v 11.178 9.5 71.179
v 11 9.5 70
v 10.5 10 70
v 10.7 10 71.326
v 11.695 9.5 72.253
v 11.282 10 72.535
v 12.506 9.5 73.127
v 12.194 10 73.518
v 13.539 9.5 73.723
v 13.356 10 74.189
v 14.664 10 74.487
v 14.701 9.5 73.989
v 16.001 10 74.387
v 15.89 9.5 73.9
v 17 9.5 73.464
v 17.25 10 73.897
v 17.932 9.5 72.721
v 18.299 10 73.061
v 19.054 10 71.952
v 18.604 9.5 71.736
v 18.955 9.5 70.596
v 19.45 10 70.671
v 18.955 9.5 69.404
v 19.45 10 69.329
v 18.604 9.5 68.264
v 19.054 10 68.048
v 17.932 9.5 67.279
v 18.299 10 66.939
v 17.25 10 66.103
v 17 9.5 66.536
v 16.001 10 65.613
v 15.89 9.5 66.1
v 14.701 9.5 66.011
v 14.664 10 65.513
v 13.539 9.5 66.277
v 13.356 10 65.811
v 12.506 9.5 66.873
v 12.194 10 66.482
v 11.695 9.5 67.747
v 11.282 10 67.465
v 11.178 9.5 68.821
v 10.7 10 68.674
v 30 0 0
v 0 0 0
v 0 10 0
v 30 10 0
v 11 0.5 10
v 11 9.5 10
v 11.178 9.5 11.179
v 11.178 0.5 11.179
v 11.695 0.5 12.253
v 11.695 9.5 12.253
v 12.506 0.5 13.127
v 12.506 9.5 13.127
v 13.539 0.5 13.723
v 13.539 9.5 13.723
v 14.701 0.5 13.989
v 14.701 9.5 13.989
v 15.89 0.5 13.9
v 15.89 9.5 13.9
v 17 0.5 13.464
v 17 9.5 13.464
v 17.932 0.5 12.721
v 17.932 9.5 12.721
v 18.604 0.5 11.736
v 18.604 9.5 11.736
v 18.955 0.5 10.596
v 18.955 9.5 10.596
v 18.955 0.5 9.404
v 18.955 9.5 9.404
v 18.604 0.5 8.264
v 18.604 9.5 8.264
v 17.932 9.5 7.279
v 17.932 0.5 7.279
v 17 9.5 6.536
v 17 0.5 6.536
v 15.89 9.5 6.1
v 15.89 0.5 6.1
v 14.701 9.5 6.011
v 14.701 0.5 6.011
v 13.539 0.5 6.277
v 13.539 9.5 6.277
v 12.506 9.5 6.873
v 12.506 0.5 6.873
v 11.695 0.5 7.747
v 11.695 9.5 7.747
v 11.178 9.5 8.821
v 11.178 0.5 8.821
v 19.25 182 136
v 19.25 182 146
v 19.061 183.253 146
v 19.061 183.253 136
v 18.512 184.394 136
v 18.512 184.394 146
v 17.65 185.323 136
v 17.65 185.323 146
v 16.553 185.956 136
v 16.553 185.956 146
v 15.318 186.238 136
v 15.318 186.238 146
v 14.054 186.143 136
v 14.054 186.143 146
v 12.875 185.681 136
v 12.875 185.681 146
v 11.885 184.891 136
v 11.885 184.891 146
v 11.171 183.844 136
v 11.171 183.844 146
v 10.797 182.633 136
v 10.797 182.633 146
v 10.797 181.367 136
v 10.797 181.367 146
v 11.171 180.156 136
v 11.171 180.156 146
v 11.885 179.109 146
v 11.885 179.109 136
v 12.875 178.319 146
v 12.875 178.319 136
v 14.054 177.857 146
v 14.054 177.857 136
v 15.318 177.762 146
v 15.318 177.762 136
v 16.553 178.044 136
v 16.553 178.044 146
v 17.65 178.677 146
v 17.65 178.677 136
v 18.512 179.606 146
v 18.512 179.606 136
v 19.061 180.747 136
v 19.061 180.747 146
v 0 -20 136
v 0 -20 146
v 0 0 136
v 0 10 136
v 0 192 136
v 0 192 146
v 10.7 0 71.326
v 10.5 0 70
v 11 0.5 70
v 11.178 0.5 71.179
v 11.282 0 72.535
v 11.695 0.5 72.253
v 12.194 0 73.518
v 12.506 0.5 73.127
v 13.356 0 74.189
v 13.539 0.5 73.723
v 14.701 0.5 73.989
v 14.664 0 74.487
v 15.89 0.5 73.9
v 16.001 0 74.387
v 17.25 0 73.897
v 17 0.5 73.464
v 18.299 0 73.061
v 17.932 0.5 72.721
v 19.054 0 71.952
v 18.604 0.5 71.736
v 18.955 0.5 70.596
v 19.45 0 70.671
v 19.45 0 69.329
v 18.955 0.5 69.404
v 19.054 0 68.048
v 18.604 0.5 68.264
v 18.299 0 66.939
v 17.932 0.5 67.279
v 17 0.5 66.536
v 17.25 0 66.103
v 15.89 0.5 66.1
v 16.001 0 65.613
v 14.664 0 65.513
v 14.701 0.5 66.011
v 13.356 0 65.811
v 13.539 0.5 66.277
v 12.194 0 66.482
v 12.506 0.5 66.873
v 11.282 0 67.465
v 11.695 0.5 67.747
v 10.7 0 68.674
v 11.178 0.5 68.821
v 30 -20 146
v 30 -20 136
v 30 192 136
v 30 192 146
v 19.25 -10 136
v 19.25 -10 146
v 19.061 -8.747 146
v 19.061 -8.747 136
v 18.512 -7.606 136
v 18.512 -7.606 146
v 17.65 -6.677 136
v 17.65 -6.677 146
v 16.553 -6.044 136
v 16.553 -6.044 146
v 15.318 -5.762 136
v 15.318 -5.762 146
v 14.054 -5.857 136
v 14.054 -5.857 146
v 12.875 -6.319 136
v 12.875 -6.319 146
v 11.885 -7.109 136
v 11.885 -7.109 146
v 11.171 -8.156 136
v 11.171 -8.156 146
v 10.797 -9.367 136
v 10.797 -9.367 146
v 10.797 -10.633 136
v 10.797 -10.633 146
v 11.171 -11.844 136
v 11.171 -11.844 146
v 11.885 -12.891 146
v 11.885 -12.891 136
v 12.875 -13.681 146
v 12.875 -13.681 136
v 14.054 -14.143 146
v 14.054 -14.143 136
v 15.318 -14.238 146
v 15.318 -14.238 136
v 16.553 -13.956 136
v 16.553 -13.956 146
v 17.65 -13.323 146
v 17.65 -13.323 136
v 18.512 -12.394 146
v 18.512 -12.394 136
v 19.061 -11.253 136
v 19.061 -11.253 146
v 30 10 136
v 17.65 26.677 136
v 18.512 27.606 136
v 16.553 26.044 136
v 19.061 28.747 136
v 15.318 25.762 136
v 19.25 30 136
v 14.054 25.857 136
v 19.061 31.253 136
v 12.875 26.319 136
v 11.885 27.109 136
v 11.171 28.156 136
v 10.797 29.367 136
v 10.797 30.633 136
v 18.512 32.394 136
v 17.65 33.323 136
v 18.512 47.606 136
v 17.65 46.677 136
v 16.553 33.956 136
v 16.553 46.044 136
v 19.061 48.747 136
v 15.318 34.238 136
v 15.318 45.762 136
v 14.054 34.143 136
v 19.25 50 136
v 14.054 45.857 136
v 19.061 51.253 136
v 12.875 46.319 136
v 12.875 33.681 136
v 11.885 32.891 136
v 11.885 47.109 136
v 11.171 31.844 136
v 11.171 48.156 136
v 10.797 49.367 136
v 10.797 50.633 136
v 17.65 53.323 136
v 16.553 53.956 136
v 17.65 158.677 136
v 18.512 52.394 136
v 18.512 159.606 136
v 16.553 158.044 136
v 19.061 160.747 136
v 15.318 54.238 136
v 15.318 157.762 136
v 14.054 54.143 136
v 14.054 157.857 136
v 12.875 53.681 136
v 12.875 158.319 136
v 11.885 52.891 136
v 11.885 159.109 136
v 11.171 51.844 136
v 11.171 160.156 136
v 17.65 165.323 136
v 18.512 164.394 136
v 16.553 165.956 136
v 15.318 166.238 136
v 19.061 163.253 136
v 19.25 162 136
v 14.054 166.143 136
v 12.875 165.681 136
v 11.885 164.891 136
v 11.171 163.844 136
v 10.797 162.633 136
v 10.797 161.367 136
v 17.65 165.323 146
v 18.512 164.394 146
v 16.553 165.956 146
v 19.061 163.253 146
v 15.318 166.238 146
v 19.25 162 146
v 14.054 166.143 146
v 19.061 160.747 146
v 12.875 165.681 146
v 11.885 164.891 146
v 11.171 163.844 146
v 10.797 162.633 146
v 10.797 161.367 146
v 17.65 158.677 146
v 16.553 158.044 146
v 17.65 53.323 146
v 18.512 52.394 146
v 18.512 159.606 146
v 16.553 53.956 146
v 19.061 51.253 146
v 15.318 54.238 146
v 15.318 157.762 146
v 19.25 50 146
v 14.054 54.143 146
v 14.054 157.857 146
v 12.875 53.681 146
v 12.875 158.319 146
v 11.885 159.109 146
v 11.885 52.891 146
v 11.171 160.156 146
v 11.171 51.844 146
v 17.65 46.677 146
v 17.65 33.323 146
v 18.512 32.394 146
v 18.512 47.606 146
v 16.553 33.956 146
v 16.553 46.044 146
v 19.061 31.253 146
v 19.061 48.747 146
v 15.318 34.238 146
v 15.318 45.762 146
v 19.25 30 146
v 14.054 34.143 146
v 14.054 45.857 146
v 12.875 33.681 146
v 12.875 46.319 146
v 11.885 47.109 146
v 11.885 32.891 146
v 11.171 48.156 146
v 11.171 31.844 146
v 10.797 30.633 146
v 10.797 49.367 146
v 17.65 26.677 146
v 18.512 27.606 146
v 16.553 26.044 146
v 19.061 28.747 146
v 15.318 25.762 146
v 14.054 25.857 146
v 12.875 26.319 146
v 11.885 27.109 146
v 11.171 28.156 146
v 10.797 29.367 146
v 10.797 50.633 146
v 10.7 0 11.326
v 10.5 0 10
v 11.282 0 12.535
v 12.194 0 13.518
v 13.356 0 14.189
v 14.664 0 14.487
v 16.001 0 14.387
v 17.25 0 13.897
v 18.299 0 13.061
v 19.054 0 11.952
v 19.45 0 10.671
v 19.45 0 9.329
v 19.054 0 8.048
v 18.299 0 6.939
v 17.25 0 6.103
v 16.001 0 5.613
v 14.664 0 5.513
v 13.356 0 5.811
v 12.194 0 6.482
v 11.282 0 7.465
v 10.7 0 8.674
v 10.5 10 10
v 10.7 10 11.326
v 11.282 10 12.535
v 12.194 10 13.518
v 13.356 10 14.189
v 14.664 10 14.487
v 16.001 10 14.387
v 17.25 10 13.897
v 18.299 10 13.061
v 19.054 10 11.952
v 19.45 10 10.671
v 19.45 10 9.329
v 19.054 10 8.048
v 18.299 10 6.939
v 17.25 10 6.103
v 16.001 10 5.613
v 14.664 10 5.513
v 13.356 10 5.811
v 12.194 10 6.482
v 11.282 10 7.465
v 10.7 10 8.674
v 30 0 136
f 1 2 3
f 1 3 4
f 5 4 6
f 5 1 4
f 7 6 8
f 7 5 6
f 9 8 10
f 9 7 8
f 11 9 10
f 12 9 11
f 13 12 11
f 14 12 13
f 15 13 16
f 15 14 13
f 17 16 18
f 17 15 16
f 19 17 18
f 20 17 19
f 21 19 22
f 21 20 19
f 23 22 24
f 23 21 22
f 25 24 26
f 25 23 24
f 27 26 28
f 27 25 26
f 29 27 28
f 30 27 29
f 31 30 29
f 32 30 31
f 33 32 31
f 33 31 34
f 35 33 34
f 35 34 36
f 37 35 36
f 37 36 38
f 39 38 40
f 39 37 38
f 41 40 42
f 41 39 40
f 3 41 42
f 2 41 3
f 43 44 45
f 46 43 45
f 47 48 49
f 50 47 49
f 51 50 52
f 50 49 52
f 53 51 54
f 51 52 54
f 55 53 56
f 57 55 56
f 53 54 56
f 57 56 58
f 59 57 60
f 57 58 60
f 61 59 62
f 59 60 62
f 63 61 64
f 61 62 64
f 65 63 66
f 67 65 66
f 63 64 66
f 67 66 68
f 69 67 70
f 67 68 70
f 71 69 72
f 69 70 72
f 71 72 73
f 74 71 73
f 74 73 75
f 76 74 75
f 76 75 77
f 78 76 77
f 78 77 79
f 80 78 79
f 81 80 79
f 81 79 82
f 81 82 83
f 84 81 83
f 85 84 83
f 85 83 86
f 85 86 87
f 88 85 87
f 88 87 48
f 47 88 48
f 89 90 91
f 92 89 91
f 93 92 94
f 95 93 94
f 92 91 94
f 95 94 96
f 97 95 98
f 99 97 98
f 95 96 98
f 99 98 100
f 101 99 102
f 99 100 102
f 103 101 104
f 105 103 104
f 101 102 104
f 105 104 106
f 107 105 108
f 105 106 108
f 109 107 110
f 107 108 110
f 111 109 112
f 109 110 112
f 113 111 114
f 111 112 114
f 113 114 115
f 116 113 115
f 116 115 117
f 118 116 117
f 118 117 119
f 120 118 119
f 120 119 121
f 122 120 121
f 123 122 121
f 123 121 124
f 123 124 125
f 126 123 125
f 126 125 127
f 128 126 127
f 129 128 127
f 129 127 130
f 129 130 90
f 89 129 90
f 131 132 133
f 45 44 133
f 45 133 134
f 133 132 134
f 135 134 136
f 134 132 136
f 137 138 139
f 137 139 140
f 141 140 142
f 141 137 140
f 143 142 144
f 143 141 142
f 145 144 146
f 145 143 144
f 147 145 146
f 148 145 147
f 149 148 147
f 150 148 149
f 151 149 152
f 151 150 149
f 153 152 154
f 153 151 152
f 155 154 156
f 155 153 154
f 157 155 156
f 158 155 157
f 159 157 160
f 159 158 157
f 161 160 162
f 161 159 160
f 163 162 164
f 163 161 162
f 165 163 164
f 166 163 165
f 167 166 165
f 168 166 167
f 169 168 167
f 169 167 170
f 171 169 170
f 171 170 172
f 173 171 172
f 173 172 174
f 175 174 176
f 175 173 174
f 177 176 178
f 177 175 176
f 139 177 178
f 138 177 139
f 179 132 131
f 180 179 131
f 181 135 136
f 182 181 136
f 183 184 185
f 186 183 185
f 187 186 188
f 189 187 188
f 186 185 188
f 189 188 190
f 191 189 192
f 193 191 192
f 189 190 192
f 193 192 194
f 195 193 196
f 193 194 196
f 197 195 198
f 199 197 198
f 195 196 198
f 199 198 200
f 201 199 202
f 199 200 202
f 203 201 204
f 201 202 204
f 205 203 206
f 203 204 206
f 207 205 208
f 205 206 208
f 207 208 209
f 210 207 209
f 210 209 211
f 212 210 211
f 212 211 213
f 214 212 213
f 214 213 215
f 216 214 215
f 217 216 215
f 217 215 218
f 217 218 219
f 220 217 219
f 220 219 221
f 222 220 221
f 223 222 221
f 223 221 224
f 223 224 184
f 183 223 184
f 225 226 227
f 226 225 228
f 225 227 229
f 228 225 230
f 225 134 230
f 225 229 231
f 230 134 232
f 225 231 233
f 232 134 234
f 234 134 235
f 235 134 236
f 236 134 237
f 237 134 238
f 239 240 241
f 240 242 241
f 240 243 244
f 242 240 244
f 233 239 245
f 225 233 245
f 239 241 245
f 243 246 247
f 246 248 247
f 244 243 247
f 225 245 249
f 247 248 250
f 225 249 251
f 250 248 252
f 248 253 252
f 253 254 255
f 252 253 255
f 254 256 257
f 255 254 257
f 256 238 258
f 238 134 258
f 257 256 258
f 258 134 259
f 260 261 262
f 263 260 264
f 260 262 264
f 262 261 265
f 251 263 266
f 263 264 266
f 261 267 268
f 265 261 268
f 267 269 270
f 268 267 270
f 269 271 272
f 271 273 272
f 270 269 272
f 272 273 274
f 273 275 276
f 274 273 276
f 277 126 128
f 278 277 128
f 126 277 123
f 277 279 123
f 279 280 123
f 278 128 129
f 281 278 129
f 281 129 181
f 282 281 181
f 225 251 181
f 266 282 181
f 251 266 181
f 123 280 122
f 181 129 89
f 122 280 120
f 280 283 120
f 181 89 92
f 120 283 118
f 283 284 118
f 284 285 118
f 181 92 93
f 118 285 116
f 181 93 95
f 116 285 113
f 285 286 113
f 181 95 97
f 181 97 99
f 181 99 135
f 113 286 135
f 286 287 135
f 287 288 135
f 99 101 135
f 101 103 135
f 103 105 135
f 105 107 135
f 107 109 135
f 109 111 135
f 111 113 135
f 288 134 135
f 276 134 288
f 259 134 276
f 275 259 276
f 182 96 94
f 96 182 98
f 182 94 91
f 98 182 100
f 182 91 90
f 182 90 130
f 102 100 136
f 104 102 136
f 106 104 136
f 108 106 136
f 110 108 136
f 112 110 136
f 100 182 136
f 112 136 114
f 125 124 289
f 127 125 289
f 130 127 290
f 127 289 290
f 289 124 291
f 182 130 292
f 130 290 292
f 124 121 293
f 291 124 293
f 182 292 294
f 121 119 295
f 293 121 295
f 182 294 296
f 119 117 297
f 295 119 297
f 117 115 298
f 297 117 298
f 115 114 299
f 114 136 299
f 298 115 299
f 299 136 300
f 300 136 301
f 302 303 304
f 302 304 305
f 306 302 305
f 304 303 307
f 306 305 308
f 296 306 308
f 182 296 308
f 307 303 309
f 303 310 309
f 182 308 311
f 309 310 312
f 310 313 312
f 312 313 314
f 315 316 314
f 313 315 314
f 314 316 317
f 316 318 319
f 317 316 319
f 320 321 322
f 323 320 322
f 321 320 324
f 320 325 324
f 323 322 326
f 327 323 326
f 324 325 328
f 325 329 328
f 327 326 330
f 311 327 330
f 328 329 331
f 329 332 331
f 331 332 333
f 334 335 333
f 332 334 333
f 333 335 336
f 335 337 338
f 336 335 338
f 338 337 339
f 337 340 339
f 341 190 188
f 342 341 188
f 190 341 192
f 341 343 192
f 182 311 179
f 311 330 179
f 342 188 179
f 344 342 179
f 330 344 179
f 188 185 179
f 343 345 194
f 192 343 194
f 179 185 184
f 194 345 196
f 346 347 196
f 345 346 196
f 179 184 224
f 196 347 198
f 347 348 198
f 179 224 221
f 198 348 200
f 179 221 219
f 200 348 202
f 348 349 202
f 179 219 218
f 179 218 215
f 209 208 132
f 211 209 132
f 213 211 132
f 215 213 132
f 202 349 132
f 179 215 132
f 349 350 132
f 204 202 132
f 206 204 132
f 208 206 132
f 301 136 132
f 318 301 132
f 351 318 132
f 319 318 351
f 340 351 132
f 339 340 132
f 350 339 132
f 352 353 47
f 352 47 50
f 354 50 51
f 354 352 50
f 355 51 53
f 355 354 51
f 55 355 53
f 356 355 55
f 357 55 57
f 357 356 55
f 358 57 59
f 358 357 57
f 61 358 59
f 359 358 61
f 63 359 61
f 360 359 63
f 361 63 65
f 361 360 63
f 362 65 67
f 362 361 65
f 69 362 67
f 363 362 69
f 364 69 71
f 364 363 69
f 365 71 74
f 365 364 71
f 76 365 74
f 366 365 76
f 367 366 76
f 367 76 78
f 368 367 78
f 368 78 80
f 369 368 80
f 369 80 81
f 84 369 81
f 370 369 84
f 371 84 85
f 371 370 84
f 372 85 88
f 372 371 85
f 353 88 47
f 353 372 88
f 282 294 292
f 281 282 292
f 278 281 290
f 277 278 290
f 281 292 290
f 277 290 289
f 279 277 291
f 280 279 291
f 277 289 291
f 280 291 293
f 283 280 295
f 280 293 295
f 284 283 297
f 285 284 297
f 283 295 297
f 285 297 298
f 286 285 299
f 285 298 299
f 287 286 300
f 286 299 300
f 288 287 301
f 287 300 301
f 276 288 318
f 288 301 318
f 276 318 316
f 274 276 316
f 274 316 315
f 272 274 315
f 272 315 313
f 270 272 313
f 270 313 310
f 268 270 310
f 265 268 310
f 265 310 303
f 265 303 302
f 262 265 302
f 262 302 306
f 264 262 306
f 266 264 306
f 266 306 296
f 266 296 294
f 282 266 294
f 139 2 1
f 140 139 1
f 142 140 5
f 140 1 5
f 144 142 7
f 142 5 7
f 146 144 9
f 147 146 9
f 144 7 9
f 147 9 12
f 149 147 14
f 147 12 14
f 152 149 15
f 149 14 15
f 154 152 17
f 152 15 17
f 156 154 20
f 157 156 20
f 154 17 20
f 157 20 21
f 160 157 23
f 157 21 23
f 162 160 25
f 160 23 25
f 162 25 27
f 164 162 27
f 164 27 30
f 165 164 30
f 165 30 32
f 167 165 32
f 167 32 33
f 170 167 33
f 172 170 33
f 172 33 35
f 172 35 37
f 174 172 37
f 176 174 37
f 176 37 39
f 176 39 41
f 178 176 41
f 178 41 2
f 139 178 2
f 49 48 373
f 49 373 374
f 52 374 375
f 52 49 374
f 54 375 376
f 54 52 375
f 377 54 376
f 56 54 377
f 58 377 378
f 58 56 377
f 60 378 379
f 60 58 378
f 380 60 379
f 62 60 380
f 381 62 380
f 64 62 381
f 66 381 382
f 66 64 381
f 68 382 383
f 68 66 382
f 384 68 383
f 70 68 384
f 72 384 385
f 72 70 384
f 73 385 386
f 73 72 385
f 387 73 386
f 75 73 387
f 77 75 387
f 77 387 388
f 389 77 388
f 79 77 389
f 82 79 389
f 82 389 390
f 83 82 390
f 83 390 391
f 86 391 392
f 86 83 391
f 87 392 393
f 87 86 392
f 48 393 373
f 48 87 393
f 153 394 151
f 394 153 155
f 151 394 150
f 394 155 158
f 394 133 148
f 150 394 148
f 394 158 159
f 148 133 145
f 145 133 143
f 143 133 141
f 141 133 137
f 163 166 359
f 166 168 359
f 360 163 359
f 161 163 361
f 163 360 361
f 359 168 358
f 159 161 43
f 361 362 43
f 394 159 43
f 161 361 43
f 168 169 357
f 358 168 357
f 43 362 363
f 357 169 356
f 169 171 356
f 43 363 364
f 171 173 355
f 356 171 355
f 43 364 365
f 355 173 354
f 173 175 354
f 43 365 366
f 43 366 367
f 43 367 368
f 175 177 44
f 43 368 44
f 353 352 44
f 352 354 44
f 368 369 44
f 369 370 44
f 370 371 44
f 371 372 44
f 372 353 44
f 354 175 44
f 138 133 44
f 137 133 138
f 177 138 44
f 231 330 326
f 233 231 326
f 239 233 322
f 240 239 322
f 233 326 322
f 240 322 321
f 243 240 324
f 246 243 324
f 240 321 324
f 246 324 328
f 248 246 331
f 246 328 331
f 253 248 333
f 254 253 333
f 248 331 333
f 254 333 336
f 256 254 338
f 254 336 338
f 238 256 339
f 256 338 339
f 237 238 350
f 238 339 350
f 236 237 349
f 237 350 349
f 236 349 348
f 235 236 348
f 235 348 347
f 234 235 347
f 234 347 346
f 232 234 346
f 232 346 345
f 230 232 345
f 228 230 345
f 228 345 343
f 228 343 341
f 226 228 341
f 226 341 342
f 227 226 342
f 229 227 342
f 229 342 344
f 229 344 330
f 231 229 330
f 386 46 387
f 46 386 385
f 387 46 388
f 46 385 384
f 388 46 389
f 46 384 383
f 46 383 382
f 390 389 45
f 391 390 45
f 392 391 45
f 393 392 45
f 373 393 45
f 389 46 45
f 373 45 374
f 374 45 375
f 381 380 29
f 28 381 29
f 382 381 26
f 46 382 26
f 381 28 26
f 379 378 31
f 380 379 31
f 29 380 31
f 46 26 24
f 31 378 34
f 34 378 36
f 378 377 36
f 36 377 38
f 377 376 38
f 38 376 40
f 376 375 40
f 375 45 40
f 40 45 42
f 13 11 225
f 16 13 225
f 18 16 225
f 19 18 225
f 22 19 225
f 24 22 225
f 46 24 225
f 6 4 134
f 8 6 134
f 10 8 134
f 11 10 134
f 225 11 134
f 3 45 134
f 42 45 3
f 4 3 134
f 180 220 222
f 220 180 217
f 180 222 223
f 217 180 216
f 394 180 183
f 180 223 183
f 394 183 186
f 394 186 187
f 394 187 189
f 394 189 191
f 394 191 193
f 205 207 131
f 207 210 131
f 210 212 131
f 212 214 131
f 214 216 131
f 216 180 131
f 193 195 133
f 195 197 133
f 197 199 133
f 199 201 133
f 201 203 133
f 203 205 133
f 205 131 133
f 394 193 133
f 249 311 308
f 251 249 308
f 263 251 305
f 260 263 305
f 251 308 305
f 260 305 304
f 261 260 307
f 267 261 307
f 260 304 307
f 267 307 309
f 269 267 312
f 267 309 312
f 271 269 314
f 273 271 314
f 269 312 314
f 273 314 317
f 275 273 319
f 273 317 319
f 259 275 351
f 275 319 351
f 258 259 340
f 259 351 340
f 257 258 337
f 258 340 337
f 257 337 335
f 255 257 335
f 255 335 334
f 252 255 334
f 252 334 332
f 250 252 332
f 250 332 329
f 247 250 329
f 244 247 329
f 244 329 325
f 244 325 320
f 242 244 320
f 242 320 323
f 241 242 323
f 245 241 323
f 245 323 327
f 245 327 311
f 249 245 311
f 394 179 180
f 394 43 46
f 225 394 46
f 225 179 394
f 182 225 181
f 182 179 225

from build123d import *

# Parameters (mm, degrees)
F1_DEPTH = 30
F2_R     = 4
F3_DEPTH = 30.001
F4_SIZE  = 0.5
F5_R     = 4.25
F6_DEPTH = 146.001


with BuildPart() as f1:
    # F0 (on Right) → F1 (new body)
    with BuildSketch(Plane.YZ):
        Polygon((10, 0), (10, 136), (192, 136), (192, 146), (0, 146), (-20, 146), (-20, 136), (0, 136), (0, 0), align=None)
    extrude(amount=F1_DEPTH)

    # F2 (on face) → F3 (cut, through all)
    with BuildSketch(Plane(origin=(0, 10, 0), x_dir=(-1, 0, 0), z_dir=(0, 1, 0))):
        with Locations((-15, 70)):
            Circle(F2_R)
        with Locations((-15, 10)):
            Circle(F2_R)
    extrude(amount=-F3_DEPTH, mode=Mode.SUBTRACT)

    # F4
    f4_edges = [f1.edges().sort_by_distance(p)[0] for p in [
        (19, 10, 70),
        (11, 5, 70),
        (19, 0, 70),
        (19, 10, 10),
        (11, 5, 10),
        (19, 0, 10),
    ]]
    chamfer(f4_edges, length=F4_SIZE)

    # F5 (on face) → F6 (cut, through all)
    with BuildSketch(Plane.XY.offset(146)):
        with Locations((15, 182)):
            Circle(F5_R)
        with Locations((15, 162)):
            Circle(F5_R)
        with Locations((15, -10)):
            Circle(F5_R)
        with Locations((15, 30)):
            Circle(F5_R)
        with Locations((15, 50)):
            Circle(F5_R)
    extrude(amount=-F6_DEPTH, mode=Mode.SUBTRACT)


solid = f1.part
